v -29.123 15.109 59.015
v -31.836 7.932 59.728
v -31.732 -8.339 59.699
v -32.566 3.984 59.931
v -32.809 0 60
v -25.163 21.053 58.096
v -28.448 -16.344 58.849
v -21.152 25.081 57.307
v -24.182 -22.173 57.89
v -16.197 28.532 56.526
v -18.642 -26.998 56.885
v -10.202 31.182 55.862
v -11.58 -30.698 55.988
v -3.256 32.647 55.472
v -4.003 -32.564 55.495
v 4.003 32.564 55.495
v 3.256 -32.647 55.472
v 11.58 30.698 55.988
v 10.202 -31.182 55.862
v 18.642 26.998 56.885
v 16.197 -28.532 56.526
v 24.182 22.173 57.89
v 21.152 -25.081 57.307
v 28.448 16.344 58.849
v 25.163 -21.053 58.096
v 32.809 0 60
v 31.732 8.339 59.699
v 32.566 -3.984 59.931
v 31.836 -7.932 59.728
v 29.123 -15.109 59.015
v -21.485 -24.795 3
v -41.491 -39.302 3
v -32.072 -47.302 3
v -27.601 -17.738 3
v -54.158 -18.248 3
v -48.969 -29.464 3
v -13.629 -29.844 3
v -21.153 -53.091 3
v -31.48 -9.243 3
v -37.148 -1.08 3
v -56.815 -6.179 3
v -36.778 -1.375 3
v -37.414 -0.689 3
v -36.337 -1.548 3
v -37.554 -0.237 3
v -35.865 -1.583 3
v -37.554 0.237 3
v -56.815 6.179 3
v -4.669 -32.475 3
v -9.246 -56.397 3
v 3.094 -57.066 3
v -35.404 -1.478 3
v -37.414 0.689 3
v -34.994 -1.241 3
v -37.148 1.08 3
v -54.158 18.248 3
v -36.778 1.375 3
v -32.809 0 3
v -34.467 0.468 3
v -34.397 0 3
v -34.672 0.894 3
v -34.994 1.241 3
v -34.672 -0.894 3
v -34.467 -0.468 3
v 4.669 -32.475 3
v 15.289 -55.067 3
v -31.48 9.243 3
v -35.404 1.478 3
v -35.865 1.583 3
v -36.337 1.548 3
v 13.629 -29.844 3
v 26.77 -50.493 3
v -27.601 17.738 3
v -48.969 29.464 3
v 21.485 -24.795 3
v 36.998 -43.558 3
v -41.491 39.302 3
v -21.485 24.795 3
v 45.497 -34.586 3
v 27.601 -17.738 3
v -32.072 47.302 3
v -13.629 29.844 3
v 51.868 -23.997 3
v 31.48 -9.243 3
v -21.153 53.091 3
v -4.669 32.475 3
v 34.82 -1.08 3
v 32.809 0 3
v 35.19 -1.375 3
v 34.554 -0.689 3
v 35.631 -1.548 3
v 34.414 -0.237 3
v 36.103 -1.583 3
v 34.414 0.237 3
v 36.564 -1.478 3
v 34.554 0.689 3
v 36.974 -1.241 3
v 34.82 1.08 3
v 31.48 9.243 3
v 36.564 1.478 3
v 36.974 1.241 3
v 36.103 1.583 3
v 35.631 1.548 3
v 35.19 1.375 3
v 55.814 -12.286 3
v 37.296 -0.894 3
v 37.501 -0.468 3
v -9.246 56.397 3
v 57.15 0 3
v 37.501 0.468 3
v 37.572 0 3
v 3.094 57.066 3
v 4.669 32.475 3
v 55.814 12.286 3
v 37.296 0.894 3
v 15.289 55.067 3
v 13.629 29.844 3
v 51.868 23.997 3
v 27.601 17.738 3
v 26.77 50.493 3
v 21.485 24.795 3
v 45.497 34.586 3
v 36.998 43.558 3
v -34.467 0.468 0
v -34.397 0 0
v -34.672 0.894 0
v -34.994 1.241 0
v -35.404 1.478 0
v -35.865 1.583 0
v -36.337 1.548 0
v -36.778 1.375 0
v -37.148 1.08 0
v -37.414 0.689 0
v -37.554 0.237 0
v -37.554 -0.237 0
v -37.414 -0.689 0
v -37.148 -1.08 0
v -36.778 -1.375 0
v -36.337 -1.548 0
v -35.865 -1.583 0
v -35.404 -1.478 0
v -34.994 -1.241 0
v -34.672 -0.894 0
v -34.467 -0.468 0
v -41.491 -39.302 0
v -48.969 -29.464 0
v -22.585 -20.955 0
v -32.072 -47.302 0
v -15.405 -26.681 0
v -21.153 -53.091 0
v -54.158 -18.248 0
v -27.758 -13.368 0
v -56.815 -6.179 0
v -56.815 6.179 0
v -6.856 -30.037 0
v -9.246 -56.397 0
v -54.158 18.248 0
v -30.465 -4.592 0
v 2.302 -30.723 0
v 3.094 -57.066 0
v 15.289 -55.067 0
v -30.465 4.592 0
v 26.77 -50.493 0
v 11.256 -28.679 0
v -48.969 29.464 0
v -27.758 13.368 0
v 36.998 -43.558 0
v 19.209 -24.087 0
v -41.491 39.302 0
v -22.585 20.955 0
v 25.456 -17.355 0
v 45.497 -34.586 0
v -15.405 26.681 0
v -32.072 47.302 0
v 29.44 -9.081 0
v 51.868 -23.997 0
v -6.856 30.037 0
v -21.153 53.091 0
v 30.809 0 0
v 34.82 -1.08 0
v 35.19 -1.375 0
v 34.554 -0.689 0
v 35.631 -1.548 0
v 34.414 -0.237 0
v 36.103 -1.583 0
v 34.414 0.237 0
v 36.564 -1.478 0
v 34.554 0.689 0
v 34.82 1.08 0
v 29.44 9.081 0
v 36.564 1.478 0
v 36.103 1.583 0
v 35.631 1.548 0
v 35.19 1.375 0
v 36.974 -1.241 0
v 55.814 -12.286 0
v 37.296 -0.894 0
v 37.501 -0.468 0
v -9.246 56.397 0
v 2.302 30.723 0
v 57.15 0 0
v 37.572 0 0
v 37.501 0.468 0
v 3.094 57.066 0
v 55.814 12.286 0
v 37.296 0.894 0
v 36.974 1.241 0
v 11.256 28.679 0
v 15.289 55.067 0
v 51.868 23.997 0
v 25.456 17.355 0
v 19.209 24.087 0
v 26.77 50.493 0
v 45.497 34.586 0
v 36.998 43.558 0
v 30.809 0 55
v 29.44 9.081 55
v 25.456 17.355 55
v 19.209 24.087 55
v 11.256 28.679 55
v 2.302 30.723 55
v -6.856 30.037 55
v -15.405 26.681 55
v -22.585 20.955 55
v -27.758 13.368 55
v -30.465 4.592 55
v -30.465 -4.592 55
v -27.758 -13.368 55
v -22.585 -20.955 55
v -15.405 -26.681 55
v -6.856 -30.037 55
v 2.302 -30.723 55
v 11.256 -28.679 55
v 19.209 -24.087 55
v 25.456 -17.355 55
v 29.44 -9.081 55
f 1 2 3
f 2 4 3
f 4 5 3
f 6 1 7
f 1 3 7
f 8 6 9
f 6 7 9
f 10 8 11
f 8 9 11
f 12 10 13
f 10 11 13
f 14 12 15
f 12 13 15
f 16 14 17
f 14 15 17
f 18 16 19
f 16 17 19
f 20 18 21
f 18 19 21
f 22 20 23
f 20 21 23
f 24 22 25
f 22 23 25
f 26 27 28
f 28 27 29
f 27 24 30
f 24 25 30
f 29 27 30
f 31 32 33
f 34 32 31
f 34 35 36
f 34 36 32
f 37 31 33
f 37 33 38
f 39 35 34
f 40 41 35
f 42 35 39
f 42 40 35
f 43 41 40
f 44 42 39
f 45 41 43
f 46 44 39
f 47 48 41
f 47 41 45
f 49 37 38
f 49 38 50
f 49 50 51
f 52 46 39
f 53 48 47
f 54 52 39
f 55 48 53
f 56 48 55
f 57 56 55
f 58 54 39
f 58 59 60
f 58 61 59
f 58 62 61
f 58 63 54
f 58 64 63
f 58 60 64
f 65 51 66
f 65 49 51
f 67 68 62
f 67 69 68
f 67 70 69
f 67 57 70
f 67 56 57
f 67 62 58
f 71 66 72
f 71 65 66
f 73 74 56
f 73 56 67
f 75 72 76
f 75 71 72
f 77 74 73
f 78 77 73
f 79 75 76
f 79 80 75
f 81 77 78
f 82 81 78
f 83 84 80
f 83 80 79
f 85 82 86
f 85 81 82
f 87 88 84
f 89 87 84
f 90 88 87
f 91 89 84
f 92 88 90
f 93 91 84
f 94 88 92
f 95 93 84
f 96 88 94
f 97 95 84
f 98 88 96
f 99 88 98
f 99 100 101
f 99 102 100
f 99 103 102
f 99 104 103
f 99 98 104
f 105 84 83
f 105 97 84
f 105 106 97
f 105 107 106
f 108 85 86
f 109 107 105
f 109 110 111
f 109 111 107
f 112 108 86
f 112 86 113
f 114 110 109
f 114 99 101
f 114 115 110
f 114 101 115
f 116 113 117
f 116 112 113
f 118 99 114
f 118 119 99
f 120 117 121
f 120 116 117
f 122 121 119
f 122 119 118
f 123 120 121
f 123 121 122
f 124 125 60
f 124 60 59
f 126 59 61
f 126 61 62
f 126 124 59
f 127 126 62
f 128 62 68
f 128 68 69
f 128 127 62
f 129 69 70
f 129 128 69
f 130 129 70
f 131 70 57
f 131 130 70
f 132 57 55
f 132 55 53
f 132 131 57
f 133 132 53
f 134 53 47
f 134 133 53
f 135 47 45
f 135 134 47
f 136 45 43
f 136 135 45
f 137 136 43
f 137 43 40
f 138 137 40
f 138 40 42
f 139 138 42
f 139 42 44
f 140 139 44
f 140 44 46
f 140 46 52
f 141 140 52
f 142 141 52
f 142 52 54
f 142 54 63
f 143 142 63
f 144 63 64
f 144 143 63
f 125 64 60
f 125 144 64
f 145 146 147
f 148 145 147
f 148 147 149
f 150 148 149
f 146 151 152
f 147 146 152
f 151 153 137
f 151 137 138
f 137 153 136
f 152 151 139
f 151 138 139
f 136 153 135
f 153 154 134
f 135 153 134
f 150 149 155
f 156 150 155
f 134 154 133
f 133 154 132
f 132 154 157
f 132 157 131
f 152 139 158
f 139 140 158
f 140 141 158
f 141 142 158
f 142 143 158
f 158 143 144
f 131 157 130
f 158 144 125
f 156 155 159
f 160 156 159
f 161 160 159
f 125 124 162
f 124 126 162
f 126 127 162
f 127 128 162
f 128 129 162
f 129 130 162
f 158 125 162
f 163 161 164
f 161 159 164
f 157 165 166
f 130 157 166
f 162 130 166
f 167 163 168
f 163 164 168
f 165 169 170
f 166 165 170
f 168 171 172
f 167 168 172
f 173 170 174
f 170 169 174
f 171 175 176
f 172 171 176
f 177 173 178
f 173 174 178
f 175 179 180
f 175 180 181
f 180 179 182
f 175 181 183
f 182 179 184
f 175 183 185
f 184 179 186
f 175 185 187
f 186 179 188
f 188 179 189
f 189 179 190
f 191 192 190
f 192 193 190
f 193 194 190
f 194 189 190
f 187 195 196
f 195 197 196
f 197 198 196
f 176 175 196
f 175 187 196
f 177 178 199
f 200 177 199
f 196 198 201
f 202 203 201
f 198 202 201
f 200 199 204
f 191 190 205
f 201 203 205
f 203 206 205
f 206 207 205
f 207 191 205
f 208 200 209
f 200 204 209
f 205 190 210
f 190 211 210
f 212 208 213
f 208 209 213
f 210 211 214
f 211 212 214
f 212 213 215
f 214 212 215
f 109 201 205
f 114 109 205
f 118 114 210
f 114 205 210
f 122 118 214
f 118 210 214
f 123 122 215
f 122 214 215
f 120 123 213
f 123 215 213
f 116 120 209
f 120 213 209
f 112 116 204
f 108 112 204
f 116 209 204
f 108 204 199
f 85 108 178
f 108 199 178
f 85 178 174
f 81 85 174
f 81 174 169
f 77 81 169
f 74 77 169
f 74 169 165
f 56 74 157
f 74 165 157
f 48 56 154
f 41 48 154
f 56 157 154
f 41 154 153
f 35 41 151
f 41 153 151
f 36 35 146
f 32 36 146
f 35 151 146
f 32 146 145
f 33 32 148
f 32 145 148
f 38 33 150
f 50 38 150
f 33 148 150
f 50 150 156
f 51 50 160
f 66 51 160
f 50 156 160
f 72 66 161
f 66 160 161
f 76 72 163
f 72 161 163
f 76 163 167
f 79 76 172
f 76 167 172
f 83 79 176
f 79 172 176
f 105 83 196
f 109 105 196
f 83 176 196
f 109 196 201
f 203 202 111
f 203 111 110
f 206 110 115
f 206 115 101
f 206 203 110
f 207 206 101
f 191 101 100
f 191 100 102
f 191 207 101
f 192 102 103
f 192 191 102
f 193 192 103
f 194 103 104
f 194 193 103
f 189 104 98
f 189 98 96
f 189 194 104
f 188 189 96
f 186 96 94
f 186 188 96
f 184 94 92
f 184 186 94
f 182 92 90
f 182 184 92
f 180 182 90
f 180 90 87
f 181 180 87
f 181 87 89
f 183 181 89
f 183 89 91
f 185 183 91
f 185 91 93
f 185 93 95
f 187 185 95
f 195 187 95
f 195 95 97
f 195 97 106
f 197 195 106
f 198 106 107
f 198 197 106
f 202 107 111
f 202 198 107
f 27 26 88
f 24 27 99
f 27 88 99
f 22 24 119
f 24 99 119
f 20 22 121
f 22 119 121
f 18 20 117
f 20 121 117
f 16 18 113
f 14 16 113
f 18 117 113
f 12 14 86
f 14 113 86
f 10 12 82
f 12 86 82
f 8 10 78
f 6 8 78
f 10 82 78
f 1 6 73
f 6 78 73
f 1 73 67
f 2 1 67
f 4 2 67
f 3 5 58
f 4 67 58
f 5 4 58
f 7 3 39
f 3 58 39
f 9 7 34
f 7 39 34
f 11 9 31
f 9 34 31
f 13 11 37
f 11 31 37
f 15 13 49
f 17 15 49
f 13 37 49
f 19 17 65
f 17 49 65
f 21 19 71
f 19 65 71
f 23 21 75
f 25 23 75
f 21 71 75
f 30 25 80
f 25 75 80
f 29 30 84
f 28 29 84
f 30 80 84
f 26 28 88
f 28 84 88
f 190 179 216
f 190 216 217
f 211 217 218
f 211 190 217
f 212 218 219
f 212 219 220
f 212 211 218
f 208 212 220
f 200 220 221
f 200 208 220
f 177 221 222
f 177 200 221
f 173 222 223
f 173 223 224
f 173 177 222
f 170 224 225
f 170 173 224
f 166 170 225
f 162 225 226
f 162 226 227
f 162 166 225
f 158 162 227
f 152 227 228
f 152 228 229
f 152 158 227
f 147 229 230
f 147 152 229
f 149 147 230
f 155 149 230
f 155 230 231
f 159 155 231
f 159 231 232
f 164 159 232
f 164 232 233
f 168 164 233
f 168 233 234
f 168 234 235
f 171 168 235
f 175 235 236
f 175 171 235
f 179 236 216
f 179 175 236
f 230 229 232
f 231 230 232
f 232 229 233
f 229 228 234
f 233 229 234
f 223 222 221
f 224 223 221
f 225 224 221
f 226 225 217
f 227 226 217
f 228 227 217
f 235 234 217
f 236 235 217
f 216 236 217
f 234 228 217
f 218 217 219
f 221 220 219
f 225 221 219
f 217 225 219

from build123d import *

# Parameters (mm, degrees)
F0_R     = 57.15
F0_R_2   = 1.5875
F0_R_3   = 32.8090175067
F1_DEPTH = 3
F0_R_4   = 30.8090175067
F2_DEPTH = 60
F3_DEPTH = 55
F5_DEPTH = 40.5


with BuildPart() as f1:
    # F0 (on Top) → F1 (new body)
    with BuildSketch(Plane.XY):
        Circle(F0_R)
        with Locations((-35.9840175067, 0)):
            Circle(F0_R_2, mode=Mode.SUBTRACT)
        Circle(F0_R_3, mode=Mode.SUBTRACT)
        with Locations((35.9840175067, 0)):
            Circle(F0_R_2, mode=Mode.SUBTRACT)
    extrude(amount=F1_DEPTH)

    # F0 (on Top) → F2 (join)
    with BuildSketch(Plane.XY):
        Circle(F0_R_3)
        Circle(F0_R_4, mode=Mode.SUBTRACT)
        Circle(F0_R_4)
    extrude(amount=F2_DEPTH)

    # F0 (on Top) → F3 (cut)
    with BuildSketch(Plane.XY):
        Circle(F0_R_4)
    extrude(amount=F3_DEPTH, mode=Mode.SUBTRACT)

    # F4 (on Front) → F5 (cut, symmetric)
    with BuildSketch(Plane.XZ):
        with BuildLine():
            Line((32.8090175067, 60), (-32.8090175067, 60))
            ThreePointArc((-32.8090175067, 60), (0, 55.4277625628), (32.8090175067, 60))
        make_face()
    extrude(amount=F5_DEPTH, both=True, mode=Mode.SUBTRACT)


solid = f1.part
